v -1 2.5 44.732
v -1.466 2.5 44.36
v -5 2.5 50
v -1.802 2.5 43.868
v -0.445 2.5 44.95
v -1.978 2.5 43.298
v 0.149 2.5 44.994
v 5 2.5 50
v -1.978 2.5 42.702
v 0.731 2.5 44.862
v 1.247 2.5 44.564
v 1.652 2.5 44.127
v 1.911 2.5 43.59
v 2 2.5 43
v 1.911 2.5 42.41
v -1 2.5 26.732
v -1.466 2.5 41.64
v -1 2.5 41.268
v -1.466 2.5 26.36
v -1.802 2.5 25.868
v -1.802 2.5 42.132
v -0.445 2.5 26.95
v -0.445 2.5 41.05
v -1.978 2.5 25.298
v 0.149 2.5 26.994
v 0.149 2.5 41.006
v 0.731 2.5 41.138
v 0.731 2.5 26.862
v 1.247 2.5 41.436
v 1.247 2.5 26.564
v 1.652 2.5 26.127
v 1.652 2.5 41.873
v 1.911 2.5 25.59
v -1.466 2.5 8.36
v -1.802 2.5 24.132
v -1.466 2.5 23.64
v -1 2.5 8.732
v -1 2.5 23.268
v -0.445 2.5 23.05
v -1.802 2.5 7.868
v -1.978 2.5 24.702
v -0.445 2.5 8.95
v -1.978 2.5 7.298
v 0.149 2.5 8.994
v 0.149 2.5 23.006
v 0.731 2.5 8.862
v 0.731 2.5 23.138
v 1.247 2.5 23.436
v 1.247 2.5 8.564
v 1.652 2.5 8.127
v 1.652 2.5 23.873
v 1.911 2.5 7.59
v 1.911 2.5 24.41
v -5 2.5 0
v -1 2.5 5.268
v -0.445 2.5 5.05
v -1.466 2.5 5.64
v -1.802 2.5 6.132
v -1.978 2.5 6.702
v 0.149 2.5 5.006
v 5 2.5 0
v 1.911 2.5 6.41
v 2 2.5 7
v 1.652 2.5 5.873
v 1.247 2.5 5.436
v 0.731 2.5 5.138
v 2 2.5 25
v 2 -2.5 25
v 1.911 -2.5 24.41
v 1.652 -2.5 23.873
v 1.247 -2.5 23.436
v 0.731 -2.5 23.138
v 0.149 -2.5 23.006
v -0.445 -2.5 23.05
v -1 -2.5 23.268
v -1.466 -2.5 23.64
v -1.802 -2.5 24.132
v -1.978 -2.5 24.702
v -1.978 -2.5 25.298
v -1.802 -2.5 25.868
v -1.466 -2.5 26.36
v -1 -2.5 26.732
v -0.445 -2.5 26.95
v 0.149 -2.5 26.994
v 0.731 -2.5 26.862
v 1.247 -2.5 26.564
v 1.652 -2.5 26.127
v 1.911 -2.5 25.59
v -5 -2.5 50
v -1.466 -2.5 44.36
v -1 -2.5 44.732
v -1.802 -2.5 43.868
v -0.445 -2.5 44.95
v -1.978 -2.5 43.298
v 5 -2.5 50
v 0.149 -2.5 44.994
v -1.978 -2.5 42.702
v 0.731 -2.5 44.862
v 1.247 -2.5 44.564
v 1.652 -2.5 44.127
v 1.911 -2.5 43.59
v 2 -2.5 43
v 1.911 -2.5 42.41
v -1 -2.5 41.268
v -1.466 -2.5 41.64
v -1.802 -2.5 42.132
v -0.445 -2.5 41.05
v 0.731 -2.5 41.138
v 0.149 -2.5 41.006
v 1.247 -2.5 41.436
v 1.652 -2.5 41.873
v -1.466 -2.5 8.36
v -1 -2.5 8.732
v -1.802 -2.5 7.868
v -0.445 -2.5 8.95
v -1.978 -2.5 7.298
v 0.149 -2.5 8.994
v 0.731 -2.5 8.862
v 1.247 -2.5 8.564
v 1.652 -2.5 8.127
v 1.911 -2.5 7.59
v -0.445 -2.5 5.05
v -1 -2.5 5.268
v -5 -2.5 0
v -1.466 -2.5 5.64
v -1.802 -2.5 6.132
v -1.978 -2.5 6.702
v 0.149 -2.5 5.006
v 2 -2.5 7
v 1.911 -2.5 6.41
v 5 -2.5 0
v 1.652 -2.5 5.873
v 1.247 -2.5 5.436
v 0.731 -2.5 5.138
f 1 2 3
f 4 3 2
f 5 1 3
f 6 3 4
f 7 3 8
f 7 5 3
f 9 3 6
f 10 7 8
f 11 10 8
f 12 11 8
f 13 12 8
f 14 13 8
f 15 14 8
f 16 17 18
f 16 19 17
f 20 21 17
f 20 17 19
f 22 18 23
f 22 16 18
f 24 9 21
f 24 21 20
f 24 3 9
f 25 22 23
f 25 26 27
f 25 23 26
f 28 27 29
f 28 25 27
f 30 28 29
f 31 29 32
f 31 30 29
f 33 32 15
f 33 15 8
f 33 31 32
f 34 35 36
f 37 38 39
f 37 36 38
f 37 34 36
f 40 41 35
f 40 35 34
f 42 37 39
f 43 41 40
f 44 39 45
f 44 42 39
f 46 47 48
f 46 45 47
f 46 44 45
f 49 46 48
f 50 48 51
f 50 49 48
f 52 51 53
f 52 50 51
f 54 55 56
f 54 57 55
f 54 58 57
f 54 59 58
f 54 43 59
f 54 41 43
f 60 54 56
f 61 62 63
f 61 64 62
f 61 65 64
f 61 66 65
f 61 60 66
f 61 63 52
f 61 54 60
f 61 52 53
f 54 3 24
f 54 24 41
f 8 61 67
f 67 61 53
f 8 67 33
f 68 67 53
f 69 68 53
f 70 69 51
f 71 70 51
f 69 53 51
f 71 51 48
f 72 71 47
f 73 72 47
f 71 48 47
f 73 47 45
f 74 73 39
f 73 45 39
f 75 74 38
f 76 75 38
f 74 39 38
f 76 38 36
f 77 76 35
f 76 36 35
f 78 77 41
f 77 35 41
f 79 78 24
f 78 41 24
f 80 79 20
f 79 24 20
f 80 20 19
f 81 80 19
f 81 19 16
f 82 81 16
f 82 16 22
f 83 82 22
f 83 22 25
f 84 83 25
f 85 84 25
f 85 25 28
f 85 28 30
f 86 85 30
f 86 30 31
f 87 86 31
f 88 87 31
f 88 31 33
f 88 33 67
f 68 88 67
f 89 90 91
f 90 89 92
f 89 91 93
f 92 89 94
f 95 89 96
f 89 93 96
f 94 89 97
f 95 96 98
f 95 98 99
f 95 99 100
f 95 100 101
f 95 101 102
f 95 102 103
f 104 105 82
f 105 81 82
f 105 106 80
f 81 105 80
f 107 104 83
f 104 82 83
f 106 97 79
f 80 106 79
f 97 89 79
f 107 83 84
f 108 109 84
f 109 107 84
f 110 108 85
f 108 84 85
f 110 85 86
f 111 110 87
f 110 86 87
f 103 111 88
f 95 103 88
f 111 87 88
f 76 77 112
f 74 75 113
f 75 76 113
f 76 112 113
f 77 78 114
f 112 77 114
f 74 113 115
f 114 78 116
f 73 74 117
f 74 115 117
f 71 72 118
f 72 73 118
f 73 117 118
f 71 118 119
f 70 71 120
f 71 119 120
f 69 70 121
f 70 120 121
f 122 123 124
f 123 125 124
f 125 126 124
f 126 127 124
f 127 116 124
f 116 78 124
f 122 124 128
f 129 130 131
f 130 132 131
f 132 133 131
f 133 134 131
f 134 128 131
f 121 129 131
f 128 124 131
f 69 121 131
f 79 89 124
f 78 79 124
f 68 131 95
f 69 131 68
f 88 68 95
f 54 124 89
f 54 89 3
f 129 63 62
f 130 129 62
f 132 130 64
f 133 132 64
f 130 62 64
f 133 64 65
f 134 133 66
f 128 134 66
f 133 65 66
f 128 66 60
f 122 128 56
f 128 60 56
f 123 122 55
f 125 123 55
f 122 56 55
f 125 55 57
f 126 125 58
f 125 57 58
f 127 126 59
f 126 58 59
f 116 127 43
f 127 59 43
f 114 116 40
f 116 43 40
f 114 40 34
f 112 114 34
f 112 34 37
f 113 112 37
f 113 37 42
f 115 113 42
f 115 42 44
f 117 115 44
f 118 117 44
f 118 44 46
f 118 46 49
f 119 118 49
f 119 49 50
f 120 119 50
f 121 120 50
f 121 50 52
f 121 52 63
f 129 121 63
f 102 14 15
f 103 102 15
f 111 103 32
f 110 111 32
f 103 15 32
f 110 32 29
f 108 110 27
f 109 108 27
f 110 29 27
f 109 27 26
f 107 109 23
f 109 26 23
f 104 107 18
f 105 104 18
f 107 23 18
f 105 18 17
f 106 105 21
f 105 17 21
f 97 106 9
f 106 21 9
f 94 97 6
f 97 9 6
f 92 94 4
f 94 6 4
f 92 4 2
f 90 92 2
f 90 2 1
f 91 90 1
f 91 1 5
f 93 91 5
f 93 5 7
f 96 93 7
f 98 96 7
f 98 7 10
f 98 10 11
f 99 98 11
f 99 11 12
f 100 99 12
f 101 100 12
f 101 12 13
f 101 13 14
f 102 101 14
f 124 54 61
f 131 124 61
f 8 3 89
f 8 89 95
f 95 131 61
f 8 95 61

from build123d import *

# Parameters (mm, degrees)
SKETCH1_W           = 10
SKETCH1_H           = 5
BOSS_EXTRUDE1_DEPTH = 50
SKETCH2_R           = 2
CUT_EXTRUDE1_DEPTH  = 10


with BuildPart() as part:
    # Sketch1 → Boss-Extrude1 (new body)
    with BuildSketch(Plane.XY):
        Rectangle(SKETCH1_W, SKETCH1_H)
    extrude(amount=BOSS_EXTRUDE1_DEPTH)

    # Sketch2 → Cut-Extrude1 (cut)
    with BuildSketch(Plane(origin=(0, 2.5, 0), x_dir=(1, 0, 0), z_dir=(0, 1, 0))):
        with Locations((0, -43)):
            Circle(SKETCH2_R)
        with Locations((0, -25)):
            Circle(SKETCH2_R)
        with Locations((0, -7)):
            Circle(SKETCH2_R)
    extrude(amount=-CUT_EXTRUDE1_DEPTH, mode=Mode.SUBTRACT)


solid = part.part
